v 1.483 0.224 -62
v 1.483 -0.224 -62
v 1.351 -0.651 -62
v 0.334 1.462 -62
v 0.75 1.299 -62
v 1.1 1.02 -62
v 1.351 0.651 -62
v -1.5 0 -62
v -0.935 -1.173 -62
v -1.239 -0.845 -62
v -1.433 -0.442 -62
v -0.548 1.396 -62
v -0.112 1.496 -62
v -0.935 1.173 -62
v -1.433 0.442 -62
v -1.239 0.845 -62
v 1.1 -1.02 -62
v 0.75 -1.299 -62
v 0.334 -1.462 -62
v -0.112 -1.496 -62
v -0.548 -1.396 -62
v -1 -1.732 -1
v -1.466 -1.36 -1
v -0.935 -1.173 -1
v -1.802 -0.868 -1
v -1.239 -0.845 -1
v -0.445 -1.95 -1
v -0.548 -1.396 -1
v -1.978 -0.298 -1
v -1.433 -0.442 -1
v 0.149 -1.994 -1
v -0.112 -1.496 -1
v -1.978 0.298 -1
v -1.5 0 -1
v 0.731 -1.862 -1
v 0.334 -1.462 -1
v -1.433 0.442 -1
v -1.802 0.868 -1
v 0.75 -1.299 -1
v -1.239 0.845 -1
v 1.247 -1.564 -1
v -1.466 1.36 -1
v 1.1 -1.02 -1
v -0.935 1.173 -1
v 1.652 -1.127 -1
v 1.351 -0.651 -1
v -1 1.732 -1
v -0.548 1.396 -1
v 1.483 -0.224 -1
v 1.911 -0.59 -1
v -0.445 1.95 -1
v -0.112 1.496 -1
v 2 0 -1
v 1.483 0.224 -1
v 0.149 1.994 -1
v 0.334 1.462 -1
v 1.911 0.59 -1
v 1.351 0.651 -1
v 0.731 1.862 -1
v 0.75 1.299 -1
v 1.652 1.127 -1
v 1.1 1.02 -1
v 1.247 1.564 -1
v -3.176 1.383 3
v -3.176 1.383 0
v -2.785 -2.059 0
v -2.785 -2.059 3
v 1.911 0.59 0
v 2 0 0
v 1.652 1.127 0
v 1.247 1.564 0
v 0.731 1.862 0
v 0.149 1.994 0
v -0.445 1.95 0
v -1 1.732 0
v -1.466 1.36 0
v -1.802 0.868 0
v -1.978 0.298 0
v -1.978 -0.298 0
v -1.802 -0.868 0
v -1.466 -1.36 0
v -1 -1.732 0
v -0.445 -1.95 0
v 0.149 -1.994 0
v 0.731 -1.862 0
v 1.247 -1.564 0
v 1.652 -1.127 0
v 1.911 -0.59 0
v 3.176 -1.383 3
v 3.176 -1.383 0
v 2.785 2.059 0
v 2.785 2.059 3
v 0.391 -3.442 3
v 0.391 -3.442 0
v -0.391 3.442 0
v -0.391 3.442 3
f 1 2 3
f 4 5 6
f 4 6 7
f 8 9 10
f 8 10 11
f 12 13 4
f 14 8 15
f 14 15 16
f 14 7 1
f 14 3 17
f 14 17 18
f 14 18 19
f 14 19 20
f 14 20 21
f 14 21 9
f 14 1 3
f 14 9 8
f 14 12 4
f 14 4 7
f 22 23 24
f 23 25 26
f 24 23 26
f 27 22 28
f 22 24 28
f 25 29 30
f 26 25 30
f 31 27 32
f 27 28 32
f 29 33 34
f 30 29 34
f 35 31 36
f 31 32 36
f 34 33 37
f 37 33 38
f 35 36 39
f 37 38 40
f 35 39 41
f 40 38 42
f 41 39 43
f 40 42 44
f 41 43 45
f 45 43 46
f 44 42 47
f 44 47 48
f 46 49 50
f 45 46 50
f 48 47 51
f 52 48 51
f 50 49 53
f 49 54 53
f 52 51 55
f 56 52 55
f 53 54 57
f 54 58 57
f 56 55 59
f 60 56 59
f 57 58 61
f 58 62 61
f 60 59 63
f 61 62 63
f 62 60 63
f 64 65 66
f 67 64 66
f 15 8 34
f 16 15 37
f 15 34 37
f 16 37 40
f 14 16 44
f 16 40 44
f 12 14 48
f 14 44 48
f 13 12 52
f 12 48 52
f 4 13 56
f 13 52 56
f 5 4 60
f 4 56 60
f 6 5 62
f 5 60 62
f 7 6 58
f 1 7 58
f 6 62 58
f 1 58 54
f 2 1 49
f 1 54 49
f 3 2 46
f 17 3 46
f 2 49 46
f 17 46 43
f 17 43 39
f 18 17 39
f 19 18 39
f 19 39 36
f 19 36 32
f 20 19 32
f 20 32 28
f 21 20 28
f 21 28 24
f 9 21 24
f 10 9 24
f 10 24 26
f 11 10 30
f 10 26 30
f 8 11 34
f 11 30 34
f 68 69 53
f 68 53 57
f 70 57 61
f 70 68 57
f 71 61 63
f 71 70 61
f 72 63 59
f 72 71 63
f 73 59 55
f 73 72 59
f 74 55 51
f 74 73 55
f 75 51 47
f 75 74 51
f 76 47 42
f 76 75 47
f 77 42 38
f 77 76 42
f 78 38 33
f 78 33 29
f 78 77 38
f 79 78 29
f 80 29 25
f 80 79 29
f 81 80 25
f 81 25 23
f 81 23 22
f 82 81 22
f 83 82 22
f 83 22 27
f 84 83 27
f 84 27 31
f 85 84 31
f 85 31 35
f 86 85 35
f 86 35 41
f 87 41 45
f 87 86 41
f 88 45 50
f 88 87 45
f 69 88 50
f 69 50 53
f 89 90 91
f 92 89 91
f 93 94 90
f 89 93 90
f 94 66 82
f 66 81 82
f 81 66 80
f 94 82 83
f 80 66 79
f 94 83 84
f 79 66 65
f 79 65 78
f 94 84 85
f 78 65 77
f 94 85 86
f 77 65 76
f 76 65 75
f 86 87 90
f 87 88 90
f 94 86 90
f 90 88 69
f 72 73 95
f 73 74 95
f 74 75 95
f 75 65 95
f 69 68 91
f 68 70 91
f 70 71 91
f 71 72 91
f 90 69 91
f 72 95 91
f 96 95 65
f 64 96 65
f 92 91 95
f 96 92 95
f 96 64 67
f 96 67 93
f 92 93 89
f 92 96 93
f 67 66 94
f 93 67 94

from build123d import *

# Parameters (mm, degrees)
BOSS_EXTRUDE1_DEPTH = 3
SKETCH2_R           = 2
BOSS_EXTRUDE2_DEPTH = 1
SKETCH4_R           = 1.5
BOSS_EXTRUDE3_DEPTH = 61


with BuildPart() as part:
    # Sketch1 → Boss-Extrude1 (new body)
    with BuildSketch(Plane.XY):
        Polygon((-3.176229493, 1.382594015), (-2.785476286, -2.059398422), (0.390753207, -3.441992436), (3.176229493, -1.382594015), (2.785476286, 2.059398422), (-0.390753207, 3.441992436), align=None)
    extrude(amount=BOSS_EXTRUDE1_DEPTH)

    # Sketch2 → Boss-Extrude2 (add)
    with BuildSketch(Plane.XY):
        Circle(SKETCH2_R)
    extrude(amount=-BOSS_EXTRUDE2_DEPTH)

    # Sketch4 → Boss-Extrude3 (add)
    with BuildSketch(Plane(origin=(0, 0, -1), x_dir=(-1, 0, 0), z_dir=(0, 0, -1))):
        Circle(SKETCH4_R)
    extrude(amount=BOSS_EXTRUDE3_DEPTH)


solid = part.part
